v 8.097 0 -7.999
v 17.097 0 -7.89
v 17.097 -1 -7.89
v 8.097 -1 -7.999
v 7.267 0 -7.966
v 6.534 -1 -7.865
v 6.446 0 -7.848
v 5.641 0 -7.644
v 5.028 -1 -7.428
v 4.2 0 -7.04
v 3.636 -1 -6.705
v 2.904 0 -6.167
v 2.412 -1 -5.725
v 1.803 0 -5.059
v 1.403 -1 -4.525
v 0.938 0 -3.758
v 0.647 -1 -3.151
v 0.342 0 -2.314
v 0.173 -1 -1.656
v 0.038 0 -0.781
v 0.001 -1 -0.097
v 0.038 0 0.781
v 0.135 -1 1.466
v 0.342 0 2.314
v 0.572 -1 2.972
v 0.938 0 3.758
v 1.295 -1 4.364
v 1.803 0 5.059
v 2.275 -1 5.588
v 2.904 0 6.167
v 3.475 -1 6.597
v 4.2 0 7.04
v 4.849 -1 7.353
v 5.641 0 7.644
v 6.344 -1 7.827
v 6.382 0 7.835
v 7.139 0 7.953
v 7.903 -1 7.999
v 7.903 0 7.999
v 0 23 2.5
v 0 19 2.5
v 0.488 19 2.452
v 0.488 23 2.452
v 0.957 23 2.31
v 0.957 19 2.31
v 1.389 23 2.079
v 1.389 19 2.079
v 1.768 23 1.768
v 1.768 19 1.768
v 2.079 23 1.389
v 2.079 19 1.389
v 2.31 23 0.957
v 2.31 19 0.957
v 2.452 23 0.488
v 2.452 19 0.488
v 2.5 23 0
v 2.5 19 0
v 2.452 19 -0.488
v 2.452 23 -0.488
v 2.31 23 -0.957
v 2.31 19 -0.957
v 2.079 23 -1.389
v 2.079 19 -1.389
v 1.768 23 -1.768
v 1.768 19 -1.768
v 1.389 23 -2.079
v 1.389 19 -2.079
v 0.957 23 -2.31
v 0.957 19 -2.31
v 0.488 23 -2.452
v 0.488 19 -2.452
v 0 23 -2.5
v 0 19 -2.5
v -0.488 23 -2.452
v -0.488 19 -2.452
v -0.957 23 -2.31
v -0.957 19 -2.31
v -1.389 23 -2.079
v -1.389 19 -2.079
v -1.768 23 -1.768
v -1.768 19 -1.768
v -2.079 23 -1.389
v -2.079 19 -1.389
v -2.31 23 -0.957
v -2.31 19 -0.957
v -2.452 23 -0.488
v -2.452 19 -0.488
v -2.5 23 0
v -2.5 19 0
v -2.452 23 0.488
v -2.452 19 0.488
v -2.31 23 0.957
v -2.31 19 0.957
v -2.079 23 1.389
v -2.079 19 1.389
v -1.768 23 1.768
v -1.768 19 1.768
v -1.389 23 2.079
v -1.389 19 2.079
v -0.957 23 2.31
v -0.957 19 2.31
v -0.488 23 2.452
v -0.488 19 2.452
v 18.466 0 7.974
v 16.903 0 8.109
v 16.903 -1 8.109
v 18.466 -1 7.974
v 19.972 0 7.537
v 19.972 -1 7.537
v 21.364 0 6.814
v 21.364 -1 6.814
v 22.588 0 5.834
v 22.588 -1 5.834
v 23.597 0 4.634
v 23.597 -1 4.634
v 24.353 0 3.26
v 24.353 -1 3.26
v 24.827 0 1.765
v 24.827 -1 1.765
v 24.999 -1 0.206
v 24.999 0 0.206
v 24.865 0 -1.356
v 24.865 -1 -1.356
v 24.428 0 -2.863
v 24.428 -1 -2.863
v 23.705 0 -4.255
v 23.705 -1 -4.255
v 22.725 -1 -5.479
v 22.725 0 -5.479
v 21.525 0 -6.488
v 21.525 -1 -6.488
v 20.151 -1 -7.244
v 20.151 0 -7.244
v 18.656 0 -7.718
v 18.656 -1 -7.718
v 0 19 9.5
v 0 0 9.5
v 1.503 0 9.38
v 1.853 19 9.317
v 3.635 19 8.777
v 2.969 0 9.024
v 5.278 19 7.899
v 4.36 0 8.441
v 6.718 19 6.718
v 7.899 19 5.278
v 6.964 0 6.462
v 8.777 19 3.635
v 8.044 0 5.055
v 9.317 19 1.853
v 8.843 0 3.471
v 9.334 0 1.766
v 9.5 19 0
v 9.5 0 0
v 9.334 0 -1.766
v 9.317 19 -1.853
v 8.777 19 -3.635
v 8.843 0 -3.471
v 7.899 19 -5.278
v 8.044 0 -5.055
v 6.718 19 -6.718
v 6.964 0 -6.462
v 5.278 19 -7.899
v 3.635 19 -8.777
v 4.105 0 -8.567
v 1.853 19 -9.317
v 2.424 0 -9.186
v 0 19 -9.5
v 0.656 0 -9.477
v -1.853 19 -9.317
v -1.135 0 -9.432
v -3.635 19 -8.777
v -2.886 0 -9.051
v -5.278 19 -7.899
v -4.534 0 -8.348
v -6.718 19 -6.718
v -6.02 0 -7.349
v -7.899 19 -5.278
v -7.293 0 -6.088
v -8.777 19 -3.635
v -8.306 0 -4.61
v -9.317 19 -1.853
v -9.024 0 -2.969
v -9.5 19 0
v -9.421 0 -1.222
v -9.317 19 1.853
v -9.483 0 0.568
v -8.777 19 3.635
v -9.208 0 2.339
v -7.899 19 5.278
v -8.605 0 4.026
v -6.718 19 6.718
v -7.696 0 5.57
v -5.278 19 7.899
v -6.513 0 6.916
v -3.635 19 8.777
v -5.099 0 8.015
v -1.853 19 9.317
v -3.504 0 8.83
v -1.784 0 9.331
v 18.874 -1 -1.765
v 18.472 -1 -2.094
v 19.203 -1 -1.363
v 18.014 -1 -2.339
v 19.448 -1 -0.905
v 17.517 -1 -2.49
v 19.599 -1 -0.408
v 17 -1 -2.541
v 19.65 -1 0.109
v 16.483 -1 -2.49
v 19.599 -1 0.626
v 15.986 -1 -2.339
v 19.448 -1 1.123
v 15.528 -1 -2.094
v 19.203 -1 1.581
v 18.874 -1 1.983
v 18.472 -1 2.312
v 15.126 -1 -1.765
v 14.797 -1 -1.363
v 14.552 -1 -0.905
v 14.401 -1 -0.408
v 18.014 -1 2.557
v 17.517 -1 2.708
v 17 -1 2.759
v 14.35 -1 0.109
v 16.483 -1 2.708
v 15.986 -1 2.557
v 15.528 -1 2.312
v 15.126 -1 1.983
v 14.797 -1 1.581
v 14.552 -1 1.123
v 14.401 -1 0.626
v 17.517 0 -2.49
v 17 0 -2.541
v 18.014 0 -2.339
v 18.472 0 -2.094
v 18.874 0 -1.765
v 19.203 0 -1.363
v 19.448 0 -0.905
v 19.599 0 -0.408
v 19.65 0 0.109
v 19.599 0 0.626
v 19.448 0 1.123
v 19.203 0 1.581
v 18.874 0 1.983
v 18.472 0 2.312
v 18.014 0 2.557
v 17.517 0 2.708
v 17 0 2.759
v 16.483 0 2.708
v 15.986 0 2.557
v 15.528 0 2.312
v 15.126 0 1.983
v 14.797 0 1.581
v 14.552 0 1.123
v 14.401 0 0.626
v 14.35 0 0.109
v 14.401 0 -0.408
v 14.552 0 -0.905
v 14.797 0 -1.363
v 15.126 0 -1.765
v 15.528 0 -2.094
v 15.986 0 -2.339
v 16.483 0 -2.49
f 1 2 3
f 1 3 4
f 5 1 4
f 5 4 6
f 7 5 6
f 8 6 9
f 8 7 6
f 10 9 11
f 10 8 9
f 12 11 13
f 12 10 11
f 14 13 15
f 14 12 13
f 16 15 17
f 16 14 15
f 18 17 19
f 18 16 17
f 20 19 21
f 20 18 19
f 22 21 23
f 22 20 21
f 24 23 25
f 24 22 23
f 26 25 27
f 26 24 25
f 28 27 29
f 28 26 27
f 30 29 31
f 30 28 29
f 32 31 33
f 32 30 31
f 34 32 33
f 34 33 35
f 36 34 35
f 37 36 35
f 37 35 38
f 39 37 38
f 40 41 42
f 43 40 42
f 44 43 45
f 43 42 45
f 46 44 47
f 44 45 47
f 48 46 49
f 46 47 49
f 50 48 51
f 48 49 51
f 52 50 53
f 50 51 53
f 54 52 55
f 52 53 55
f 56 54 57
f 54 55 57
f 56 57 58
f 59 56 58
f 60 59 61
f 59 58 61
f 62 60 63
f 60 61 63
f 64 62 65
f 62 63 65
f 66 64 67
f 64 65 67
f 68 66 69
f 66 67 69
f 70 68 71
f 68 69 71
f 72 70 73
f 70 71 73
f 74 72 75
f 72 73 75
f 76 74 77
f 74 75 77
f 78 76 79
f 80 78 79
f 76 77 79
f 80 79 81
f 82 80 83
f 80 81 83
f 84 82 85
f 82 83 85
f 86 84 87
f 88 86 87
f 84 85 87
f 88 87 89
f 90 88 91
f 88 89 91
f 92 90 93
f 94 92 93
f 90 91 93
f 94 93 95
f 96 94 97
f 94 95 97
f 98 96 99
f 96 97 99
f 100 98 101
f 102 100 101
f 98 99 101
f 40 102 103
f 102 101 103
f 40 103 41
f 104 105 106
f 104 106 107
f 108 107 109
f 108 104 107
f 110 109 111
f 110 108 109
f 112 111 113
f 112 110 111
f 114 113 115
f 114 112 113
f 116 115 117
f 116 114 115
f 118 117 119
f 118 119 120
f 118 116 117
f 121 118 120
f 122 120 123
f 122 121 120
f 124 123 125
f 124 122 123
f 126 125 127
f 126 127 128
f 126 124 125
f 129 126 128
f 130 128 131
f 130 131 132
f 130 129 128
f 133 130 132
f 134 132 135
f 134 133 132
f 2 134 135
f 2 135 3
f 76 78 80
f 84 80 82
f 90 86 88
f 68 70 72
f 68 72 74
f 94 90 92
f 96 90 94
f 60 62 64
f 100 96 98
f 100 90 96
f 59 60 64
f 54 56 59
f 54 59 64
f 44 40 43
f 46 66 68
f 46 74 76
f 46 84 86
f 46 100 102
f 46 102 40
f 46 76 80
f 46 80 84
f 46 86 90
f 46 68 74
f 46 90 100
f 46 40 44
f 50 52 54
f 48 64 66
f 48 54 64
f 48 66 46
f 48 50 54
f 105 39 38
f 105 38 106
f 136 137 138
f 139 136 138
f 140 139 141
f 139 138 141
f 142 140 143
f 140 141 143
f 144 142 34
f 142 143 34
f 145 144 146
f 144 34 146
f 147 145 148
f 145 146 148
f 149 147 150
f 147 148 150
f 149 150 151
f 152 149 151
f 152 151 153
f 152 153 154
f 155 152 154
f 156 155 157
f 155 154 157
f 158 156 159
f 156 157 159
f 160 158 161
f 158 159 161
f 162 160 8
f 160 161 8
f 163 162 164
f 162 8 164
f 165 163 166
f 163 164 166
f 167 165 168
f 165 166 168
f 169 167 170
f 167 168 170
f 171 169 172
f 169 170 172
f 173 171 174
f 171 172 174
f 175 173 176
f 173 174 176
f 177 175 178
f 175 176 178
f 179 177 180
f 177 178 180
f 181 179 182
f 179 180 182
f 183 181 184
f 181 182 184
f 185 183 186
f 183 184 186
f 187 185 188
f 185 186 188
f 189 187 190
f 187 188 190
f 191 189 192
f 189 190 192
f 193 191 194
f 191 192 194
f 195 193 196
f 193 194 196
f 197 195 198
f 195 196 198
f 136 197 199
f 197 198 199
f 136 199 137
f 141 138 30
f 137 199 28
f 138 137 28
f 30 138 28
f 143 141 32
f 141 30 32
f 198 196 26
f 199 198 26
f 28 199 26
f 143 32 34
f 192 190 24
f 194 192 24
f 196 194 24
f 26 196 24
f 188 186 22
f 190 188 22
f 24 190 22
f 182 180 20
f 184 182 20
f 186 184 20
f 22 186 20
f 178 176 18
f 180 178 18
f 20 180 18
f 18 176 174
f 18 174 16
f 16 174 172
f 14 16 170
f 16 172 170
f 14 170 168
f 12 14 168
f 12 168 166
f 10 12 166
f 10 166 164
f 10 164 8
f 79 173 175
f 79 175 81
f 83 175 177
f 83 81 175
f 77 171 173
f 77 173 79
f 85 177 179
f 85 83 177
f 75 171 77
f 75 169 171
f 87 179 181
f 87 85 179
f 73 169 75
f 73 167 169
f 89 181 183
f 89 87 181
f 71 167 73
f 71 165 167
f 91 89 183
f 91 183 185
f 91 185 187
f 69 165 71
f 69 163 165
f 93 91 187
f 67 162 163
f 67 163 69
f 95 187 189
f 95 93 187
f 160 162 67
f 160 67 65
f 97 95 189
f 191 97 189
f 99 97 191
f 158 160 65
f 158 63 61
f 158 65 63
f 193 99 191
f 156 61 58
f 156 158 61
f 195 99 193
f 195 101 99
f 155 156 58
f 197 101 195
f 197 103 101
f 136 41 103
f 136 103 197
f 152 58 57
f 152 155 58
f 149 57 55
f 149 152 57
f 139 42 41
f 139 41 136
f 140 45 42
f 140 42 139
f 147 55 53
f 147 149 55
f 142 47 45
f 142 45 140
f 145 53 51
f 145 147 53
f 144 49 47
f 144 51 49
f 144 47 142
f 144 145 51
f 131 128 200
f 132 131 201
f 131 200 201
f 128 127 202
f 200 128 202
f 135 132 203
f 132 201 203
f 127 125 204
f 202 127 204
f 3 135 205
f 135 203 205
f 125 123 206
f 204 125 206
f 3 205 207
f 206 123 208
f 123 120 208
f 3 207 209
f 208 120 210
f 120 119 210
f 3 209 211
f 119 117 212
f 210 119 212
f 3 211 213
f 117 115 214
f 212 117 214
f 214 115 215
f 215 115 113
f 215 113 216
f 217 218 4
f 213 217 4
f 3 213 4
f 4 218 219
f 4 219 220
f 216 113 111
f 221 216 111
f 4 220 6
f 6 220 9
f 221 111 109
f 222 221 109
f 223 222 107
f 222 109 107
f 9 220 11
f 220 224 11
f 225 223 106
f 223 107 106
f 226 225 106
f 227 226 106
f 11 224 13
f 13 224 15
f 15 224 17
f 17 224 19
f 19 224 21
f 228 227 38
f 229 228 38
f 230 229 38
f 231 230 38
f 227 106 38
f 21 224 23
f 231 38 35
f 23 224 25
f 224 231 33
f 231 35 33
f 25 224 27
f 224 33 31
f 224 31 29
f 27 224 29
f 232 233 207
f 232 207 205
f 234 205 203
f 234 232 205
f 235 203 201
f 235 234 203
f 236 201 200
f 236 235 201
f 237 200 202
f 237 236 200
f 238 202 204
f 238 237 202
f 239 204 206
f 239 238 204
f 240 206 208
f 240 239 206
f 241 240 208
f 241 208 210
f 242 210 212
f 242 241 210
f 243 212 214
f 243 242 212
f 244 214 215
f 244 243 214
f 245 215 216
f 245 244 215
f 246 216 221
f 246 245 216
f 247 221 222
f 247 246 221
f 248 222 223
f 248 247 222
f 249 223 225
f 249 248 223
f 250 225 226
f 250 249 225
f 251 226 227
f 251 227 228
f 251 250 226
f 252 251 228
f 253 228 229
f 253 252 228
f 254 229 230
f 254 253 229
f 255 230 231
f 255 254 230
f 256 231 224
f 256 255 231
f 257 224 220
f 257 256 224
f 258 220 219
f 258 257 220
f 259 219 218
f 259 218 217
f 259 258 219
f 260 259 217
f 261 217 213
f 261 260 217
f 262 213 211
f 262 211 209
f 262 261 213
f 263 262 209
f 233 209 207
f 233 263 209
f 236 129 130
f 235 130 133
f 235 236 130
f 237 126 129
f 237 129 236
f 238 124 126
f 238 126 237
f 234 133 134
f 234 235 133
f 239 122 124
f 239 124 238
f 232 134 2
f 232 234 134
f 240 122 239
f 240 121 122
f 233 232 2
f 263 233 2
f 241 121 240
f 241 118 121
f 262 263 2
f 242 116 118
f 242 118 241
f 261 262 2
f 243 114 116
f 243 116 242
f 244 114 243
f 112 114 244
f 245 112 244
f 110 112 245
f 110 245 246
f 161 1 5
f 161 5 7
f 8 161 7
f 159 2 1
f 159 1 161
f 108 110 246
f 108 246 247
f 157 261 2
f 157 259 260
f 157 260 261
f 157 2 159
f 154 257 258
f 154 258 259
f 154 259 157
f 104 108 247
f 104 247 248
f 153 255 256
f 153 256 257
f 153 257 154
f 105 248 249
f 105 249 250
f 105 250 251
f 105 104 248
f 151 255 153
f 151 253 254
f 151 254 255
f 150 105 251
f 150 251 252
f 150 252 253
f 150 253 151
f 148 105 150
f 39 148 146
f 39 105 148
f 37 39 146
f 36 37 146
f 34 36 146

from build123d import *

# Parameters (mm, degrees)
SKETCH1_R           = 9.5
SKETCH1_R_2         = 2.5
BOSS_EXTRUDE1_DEPTH = 19
SKETCH2_R           = 2.5
BOSS_EXTRUDE2_DEPTH = 4
SKETCH3_R           = 2.65
BOSS_EXTRUDE3_DEPTH = 1


with BuildPart() as part:
    # Sketch1 → Boss-Extrude1 (new body)
    # profile 1 of 2: a face of its own
    with BuildSketch(Plane(origin=(0, 0, 0), x_dir=(1, 0, 0), z_dir=(0, 1, 0))):
        with Locations(Location((0, 0, 0), (0, 0, 270))):
            Circle(SKETCH1_R)
        Circle(SKETCH1_R_2, mode=Mode.SUBTRACT)
    # profile 2 of 2: a face of its own
    with BuildSketch(Plane(origin=(0, 0, 0), x_dir=(1, 0, 0), z_dir=(0, 1, 0))):
        Circle(SKETCH1_R_2)
    extrude(amount=BOSS_EXTRUDE1_DEPTH)

    # Sketch2 → Boss-Extrude2 (add)
    with BuildSketch(Plane(origin=(0, 19, 0), x_dir=(1, 0, 0), z_dir=(0, 1, 0))):
        with Locations(Location((0, 0, 0), (0, 0, 270))):
            Circle(SKETCH2_R)
    extrude(amount=BOSS_EXTRUDE2_DEPTH)

    # Sketch3 → Boss-Extrude3 (add)
    with BuildSketch(Plane.XZ):
        with BuildLine():
            Line((7.903037426, 7.99941237), (16.903037426, 8.108503279))
            ThreePointArc((16.903037426, 8.108503279), (24.99941237, 0.206053483), (17.096962574, -7.890321461))
            Line((17.096962574, -7.890321461), (8.096962574, -7.99941237))
            ThreePointArc((8.096962574, -7.99941237), (0.00058763, -0.096962574), (7.903037426, 7.99941237))
        make_face()
        with Locations(Location((17, 0.109090909, 0), (0, 0, 270))):
            Circle(SKETCH3_R, mode=Mode.SUBTRACT)
    extrude(amount=BOSS_EXTRUDE3_DEPTH)


solid = part.part
